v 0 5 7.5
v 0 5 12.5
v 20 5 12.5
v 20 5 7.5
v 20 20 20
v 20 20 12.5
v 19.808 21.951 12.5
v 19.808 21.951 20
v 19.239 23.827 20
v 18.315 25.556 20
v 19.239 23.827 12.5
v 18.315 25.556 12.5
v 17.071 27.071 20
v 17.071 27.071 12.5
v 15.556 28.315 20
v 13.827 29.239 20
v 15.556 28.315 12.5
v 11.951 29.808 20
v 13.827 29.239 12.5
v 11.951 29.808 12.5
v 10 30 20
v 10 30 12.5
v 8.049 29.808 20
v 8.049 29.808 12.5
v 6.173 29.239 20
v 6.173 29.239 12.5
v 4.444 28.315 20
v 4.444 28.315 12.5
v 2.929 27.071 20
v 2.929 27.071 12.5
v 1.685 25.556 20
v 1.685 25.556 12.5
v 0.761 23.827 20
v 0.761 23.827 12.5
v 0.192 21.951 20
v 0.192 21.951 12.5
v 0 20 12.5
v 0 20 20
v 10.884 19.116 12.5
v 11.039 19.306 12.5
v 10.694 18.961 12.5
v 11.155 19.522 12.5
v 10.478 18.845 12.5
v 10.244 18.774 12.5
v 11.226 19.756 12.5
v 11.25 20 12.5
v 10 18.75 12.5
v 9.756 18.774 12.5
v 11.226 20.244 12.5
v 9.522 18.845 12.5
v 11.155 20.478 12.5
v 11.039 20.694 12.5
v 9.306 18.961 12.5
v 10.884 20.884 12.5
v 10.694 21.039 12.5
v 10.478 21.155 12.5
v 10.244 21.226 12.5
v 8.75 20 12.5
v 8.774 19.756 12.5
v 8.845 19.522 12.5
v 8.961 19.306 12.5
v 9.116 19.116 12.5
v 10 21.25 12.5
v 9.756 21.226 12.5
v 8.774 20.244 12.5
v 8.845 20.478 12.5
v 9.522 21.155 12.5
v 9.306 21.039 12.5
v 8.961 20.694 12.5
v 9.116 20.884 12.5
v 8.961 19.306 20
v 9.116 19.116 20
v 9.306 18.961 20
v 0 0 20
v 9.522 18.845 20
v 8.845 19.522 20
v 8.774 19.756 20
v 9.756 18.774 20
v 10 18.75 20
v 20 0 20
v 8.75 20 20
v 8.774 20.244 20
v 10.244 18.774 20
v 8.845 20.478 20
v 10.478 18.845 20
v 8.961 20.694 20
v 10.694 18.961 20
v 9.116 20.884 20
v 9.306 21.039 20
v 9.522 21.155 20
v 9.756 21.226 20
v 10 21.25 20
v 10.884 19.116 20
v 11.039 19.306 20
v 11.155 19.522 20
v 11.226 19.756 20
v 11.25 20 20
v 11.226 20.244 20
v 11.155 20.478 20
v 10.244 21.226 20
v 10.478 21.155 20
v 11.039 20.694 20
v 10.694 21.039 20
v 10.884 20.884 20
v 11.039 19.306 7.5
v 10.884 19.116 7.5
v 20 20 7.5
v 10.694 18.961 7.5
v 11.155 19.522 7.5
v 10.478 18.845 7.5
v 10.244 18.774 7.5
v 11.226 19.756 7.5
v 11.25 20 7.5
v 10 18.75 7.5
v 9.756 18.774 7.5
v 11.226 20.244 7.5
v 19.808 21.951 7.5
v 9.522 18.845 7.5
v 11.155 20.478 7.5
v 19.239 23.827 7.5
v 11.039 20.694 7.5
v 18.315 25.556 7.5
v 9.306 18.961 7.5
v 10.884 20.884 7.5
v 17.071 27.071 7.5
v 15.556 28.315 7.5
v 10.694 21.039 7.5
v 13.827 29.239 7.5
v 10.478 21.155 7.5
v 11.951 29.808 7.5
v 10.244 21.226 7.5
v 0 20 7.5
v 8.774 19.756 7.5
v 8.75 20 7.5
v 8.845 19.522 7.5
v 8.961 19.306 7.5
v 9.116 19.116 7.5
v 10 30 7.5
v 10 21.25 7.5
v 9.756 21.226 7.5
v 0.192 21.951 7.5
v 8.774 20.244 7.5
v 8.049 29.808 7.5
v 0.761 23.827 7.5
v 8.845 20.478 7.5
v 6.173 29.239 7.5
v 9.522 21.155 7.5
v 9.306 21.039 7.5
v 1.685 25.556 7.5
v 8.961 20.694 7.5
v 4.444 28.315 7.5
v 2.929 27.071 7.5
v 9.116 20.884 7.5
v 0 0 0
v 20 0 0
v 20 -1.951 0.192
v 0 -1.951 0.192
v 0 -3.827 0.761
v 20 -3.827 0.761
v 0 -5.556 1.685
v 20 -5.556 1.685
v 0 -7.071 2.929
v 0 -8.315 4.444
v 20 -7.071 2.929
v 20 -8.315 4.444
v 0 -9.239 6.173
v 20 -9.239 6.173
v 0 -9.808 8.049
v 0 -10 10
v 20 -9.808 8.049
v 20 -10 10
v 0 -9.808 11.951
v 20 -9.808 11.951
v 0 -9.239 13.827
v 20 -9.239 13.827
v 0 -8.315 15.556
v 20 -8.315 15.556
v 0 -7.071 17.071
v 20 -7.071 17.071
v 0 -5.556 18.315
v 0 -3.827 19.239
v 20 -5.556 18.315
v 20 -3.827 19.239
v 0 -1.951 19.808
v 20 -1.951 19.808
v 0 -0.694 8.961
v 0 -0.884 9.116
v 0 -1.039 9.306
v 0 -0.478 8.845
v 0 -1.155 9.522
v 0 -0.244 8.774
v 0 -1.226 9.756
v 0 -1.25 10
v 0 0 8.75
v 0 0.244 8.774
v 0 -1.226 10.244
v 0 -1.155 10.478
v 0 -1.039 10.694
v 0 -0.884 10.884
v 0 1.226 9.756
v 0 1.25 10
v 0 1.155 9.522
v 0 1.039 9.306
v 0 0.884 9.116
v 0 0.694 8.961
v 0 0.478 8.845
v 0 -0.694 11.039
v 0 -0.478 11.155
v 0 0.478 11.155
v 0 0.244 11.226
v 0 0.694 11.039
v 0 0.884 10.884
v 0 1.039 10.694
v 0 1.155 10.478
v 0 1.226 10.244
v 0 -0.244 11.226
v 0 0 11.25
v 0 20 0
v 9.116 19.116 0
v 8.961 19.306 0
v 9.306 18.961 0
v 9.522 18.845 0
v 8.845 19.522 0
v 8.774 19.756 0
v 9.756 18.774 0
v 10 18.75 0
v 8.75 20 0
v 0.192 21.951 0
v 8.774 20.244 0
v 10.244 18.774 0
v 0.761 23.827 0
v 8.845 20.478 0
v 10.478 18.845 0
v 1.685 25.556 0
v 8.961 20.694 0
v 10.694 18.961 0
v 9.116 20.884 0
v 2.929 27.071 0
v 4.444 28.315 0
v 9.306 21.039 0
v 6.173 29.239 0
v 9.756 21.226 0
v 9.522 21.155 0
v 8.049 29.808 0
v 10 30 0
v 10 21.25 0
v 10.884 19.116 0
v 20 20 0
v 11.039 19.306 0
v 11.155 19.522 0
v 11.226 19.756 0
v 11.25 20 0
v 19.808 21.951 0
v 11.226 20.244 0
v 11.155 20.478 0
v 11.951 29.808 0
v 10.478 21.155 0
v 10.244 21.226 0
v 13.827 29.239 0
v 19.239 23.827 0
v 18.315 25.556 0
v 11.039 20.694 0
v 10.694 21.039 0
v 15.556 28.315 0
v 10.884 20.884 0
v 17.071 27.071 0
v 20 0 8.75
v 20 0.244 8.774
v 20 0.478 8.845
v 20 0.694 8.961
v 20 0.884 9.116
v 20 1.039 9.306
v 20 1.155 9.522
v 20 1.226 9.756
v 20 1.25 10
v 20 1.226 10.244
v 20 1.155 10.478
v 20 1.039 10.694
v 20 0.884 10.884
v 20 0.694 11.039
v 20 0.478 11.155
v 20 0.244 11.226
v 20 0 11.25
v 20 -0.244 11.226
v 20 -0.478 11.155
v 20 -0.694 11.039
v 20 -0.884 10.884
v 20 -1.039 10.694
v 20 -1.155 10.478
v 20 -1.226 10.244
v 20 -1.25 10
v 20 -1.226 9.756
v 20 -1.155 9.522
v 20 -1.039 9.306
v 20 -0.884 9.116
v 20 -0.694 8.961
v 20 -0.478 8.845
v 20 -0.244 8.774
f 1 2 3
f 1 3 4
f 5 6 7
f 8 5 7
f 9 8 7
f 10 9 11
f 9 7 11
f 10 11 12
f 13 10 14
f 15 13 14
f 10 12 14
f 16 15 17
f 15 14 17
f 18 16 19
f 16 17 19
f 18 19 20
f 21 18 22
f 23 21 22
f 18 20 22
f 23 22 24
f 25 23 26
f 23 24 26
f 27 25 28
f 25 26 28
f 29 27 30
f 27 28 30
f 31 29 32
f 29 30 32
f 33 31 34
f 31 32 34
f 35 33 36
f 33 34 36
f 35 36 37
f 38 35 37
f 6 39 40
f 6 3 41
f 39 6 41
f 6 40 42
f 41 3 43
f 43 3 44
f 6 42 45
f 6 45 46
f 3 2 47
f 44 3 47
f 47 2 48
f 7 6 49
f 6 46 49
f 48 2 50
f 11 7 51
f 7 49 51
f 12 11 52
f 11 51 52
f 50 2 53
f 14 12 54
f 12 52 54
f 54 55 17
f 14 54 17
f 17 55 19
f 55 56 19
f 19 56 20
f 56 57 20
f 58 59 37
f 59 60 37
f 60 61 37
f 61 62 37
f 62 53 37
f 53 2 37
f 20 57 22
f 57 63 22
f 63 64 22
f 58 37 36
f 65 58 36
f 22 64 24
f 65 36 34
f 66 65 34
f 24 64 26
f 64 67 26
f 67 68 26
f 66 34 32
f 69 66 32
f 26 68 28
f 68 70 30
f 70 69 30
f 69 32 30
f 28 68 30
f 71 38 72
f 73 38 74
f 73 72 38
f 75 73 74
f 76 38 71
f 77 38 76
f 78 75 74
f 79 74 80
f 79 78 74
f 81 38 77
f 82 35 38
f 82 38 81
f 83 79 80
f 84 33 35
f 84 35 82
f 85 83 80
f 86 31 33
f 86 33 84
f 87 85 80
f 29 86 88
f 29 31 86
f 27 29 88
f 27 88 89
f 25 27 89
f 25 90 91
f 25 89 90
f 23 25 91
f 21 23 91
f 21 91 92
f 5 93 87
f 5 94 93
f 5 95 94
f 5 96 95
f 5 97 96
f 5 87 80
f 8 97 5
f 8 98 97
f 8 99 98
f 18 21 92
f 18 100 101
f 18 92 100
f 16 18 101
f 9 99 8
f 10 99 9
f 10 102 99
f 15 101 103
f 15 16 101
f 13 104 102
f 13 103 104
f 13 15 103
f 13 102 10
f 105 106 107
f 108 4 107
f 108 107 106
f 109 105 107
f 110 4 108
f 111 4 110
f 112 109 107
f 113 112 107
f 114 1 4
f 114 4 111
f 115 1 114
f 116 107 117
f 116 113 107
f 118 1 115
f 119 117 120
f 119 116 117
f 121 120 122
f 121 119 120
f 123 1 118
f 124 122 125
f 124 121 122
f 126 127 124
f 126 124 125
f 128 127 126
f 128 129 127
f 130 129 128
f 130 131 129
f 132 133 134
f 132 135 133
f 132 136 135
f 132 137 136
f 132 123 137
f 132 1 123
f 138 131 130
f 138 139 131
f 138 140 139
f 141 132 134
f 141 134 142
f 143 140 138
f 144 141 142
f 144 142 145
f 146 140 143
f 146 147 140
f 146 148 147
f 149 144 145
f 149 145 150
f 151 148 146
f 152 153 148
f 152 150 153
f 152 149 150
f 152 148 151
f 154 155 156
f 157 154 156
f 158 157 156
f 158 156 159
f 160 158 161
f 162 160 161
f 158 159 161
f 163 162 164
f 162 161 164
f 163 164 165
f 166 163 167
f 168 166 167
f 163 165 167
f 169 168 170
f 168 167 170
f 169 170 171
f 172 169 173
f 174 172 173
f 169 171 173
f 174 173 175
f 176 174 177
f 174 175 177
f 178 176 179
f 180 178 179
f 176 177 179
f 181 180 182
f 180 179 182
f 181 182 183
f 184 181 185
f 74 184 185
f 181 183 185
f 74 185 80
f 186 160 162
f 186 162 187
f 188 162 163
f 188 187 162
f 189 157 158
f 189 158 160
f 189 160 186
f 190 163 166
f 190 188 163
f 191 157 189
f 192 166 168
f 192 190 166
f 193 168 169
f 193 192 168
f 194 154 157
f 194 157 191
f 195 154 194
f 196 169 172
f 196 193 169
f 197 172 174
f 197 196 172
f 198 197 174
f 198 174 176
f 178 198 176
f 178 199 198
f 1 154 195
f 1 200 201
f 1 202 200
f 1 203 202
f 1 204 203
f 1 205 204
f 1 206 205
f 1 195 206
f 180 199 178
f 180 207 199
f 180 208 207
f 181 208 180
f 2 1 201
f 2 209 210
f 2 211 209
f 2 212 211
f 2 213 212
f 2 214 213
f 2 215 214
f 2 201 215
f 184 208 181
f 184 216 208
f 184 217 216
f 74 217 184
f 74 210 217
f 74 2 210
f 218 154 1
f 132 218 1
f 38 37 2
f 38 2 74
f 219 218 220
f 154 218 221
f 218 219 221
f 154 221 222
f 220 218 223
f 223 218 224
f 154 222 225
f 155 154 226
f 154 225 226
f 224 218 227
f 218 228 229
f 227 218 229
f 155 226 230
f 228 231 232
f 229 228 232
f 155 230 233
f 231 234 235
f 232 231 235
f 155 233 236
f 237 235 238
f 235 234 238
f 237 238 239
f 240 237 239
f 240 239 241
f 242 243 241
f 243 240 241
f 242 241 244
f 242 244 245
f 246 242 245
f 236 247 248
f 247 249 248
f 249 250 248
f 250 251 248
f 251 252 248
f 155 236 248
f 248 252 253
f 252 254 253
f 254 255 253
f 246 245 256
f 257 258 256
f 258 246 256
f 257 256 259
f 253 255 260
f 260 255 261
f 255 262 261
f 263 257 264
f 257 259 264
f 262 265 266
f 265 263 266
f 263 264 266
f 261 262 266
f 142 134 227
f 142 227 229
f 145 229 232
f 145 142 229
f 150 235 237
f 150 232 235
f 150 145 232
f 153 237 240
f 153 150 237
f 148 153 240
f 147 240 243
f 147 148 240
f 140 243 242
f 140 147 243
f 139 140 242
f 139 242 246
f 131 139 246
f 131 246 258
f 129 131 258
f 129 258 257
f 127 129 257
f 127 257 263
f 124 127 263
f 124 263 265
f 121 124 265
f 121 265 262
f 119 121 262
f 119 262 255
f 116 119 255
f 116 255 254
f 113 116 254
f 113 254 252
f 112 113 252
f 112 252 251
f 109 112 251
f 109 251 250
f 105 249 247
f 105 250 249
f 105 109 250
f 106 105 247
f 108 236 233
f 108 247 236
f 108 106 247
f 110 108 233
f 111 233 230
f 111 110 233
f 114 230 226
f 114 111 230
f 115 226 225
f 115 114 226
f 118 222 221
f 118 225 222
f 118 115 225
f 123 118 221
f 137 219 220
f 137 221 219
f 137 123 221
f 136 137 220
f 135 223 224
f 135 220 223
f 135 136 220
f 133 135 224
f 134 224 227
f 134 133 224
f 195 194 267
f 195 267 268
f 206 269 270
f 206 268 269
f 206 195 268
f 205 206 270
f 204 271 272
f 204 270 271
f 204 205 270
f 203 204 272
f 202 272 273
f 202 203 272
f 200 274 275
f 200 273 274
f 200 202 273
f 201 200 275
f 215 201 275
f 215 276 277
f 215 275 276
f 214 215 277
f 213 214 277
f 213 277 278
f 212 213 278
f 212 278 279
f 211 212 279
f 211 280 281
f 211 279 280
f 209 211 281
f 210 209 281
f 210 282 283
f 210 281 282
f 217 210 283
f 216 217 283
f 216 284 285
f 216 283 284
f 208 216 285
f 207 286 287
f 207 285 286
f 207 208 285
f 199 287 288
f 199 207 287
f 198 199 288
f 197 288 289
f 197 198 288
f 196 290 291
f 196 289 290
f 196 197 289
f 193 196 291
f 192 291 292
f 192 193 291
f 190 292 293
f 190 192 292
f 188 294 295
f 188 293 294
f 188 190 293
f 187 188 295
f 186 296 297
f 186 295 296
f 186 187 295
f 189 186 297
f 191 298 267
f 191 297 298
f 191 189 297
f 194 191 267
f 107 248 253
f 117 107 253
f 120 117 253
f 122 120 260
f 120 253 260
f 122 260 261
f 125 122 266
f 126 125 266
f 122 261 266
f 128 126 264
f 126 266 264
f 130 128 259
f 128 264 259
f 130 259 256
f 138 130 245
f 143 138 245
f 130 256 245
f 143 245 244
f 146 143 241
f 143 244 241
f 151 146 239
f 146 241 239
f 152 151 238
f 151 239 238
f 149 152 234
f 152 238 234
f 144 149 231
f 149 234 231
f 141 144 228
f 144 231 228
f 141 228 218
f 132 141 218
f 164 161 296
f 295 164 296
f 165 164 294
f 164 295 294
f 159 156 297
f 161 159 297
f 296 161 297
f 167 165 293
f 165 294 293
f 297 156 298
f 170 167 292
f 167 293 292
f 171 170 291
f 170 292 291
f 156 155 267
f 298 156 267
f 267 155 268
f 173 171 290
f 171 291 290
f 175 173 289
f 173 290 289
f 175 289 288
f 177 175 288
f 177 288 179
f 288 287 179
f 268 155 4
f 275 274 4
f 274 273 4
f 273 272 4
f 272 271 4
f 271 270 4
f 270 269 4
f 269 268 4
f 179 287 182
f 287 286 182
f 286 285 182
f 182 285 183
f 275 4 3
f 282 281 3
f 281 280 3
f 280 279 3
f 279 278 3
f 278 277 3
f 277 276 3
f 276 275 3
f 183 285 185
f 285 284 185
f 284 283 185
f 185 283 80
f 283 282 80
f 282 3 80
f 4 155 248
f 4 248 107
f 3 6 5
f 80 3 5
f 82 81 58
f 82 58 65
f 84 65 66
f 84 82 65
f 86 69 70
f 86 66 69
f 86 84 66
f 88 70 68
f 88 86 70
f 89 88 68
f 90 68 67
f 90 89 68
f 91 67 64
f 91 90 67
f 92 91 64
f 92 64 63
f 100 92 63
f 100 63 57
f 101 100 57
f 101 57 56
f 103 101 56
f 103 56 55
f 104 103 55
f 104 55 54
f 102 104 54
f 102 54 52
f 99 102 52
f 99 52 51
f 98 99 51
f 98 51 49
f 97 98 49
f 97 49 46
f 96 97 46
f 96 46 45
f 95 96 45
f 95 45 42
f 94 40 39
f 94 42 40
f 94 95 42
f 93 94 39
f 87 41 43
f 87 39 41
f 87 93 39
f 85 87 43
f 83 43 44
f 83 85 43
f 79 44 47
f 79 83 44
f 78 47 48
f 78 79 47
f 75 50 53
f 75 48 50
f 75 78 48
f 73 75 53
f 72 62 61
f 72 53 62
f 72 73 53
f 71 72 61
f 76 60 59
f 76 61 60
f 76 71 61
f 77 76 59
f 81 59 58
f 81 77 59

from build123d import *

# Parameters (mm, degrees)
BOSS_EXTRUDE2_DEPTH     = 20
CUT_EXTRUDE2_DEPTH      = 42.231056256
CUT_EXTRUDE2_DEPTH_BACK = 42.231056256
SKETCH4_W               = 5
SKETCH4_H               = 25
CUT_EXTRUDE3_DEPTH      = 42.231056256
CUT_EXTRUDE3_DEPTH_BACK = 42.231056256
SKETCH5_R               = 1.25
BOSS_EXTRUDE3_DEPTH     = 20
CUT_EXTRUDE4_DEPTH      = 42.231056256
CUT_EXTRUDE4_DEPTH_BACK = 42.231056256
SKETCH7_R               = 1.25


with BuildPart() as part:
    # Sketch3 → Boss-Extrude2 (new body)
    with BuildSketch(Plane.XY):
        with BuildLine():
            Line((0, 0), (20, 0))
            Line((20, 0), (20, 20))
            ThreePointArc((20, 20), (10, 30), (0, 20))
            Line((0, 20), (0, 0))
        make_face()
    extrude(amount=BOSS_EXTRUDE2_DEPTH)

    # Sketch4 → Cut-Extrude2 (cut, two sides: drawn at the far end of the back side and taken through both)
    with BuildSketch(Plane(origin=(20, 0, 0), x_dir=(0, 0, -1), z_dir=(1, 0, 0)).offset(-CUT_EXTRUDE2_DEPTH_BACK)):
        with Locations((-10, 17.5)):
            Rectangle(SKETCH4_W, SKETCH4_H)
    extrude(amount=CUT_EXTRUDE2_DEPTH + CUT_EXTRUDE2_DEPTH_BACK, mode=Mode.SUBTRACT)

    # Sketch5 → Cut-Extrude3 (cut, two sides: drawn at the far end of the back side and taken through both)
    with BuildSketch(Plane(origin=(0, 0, 0), x_dir=(-1, 0, 0), z_dir=(0, 0, -1)).offset(-CUT_EXTRUDE3_DEPTH_BACK)):
        with Locations((-10, 20)):
            Circle(SKETCH5_R)
    extrude(amount=CUT_EXTRUDE3_DEPTH + CUT_EXTRUDE3_DEPTH_BACK, mode=Mode.SUBTRACT)

    # Sketch6 → Boss-Extrude3 (add)
    with BuildSketch(Plane(origin=(20, 0, 0), x_dir=(0, 0, -1), z_dir=(1, 0, 0))):
        with BuildLine():
            Line((-20, 0), (0, 0))
            ThreePointArc((0, 0), (-10, -10), (-20, 0))
        make_face()
    extrude(amount=-BOSS_EXTRUDE3_DEPTH)

    # Sketch7 → Cut-Extrude4 (cut, two sides: drawn at the far end of the back side and taken through both)
    with BuildSketch(Plane(origin=(20, 0, 0), x_dir=(0, 0, -1), z_dir=(1, 0, 0)).offset(-CUT_EXTRUDE4_DEPTH_BACK)):
        with Locations((-10, 0)):
            Circle(SKETCH7_R)
    extrude(amount=CUT_EXTRUDE4_DEPTH + CUT_EXTRUDE4_DEPTH_BACK, mode=Mode.SUBTRACT)


solid = part.part
